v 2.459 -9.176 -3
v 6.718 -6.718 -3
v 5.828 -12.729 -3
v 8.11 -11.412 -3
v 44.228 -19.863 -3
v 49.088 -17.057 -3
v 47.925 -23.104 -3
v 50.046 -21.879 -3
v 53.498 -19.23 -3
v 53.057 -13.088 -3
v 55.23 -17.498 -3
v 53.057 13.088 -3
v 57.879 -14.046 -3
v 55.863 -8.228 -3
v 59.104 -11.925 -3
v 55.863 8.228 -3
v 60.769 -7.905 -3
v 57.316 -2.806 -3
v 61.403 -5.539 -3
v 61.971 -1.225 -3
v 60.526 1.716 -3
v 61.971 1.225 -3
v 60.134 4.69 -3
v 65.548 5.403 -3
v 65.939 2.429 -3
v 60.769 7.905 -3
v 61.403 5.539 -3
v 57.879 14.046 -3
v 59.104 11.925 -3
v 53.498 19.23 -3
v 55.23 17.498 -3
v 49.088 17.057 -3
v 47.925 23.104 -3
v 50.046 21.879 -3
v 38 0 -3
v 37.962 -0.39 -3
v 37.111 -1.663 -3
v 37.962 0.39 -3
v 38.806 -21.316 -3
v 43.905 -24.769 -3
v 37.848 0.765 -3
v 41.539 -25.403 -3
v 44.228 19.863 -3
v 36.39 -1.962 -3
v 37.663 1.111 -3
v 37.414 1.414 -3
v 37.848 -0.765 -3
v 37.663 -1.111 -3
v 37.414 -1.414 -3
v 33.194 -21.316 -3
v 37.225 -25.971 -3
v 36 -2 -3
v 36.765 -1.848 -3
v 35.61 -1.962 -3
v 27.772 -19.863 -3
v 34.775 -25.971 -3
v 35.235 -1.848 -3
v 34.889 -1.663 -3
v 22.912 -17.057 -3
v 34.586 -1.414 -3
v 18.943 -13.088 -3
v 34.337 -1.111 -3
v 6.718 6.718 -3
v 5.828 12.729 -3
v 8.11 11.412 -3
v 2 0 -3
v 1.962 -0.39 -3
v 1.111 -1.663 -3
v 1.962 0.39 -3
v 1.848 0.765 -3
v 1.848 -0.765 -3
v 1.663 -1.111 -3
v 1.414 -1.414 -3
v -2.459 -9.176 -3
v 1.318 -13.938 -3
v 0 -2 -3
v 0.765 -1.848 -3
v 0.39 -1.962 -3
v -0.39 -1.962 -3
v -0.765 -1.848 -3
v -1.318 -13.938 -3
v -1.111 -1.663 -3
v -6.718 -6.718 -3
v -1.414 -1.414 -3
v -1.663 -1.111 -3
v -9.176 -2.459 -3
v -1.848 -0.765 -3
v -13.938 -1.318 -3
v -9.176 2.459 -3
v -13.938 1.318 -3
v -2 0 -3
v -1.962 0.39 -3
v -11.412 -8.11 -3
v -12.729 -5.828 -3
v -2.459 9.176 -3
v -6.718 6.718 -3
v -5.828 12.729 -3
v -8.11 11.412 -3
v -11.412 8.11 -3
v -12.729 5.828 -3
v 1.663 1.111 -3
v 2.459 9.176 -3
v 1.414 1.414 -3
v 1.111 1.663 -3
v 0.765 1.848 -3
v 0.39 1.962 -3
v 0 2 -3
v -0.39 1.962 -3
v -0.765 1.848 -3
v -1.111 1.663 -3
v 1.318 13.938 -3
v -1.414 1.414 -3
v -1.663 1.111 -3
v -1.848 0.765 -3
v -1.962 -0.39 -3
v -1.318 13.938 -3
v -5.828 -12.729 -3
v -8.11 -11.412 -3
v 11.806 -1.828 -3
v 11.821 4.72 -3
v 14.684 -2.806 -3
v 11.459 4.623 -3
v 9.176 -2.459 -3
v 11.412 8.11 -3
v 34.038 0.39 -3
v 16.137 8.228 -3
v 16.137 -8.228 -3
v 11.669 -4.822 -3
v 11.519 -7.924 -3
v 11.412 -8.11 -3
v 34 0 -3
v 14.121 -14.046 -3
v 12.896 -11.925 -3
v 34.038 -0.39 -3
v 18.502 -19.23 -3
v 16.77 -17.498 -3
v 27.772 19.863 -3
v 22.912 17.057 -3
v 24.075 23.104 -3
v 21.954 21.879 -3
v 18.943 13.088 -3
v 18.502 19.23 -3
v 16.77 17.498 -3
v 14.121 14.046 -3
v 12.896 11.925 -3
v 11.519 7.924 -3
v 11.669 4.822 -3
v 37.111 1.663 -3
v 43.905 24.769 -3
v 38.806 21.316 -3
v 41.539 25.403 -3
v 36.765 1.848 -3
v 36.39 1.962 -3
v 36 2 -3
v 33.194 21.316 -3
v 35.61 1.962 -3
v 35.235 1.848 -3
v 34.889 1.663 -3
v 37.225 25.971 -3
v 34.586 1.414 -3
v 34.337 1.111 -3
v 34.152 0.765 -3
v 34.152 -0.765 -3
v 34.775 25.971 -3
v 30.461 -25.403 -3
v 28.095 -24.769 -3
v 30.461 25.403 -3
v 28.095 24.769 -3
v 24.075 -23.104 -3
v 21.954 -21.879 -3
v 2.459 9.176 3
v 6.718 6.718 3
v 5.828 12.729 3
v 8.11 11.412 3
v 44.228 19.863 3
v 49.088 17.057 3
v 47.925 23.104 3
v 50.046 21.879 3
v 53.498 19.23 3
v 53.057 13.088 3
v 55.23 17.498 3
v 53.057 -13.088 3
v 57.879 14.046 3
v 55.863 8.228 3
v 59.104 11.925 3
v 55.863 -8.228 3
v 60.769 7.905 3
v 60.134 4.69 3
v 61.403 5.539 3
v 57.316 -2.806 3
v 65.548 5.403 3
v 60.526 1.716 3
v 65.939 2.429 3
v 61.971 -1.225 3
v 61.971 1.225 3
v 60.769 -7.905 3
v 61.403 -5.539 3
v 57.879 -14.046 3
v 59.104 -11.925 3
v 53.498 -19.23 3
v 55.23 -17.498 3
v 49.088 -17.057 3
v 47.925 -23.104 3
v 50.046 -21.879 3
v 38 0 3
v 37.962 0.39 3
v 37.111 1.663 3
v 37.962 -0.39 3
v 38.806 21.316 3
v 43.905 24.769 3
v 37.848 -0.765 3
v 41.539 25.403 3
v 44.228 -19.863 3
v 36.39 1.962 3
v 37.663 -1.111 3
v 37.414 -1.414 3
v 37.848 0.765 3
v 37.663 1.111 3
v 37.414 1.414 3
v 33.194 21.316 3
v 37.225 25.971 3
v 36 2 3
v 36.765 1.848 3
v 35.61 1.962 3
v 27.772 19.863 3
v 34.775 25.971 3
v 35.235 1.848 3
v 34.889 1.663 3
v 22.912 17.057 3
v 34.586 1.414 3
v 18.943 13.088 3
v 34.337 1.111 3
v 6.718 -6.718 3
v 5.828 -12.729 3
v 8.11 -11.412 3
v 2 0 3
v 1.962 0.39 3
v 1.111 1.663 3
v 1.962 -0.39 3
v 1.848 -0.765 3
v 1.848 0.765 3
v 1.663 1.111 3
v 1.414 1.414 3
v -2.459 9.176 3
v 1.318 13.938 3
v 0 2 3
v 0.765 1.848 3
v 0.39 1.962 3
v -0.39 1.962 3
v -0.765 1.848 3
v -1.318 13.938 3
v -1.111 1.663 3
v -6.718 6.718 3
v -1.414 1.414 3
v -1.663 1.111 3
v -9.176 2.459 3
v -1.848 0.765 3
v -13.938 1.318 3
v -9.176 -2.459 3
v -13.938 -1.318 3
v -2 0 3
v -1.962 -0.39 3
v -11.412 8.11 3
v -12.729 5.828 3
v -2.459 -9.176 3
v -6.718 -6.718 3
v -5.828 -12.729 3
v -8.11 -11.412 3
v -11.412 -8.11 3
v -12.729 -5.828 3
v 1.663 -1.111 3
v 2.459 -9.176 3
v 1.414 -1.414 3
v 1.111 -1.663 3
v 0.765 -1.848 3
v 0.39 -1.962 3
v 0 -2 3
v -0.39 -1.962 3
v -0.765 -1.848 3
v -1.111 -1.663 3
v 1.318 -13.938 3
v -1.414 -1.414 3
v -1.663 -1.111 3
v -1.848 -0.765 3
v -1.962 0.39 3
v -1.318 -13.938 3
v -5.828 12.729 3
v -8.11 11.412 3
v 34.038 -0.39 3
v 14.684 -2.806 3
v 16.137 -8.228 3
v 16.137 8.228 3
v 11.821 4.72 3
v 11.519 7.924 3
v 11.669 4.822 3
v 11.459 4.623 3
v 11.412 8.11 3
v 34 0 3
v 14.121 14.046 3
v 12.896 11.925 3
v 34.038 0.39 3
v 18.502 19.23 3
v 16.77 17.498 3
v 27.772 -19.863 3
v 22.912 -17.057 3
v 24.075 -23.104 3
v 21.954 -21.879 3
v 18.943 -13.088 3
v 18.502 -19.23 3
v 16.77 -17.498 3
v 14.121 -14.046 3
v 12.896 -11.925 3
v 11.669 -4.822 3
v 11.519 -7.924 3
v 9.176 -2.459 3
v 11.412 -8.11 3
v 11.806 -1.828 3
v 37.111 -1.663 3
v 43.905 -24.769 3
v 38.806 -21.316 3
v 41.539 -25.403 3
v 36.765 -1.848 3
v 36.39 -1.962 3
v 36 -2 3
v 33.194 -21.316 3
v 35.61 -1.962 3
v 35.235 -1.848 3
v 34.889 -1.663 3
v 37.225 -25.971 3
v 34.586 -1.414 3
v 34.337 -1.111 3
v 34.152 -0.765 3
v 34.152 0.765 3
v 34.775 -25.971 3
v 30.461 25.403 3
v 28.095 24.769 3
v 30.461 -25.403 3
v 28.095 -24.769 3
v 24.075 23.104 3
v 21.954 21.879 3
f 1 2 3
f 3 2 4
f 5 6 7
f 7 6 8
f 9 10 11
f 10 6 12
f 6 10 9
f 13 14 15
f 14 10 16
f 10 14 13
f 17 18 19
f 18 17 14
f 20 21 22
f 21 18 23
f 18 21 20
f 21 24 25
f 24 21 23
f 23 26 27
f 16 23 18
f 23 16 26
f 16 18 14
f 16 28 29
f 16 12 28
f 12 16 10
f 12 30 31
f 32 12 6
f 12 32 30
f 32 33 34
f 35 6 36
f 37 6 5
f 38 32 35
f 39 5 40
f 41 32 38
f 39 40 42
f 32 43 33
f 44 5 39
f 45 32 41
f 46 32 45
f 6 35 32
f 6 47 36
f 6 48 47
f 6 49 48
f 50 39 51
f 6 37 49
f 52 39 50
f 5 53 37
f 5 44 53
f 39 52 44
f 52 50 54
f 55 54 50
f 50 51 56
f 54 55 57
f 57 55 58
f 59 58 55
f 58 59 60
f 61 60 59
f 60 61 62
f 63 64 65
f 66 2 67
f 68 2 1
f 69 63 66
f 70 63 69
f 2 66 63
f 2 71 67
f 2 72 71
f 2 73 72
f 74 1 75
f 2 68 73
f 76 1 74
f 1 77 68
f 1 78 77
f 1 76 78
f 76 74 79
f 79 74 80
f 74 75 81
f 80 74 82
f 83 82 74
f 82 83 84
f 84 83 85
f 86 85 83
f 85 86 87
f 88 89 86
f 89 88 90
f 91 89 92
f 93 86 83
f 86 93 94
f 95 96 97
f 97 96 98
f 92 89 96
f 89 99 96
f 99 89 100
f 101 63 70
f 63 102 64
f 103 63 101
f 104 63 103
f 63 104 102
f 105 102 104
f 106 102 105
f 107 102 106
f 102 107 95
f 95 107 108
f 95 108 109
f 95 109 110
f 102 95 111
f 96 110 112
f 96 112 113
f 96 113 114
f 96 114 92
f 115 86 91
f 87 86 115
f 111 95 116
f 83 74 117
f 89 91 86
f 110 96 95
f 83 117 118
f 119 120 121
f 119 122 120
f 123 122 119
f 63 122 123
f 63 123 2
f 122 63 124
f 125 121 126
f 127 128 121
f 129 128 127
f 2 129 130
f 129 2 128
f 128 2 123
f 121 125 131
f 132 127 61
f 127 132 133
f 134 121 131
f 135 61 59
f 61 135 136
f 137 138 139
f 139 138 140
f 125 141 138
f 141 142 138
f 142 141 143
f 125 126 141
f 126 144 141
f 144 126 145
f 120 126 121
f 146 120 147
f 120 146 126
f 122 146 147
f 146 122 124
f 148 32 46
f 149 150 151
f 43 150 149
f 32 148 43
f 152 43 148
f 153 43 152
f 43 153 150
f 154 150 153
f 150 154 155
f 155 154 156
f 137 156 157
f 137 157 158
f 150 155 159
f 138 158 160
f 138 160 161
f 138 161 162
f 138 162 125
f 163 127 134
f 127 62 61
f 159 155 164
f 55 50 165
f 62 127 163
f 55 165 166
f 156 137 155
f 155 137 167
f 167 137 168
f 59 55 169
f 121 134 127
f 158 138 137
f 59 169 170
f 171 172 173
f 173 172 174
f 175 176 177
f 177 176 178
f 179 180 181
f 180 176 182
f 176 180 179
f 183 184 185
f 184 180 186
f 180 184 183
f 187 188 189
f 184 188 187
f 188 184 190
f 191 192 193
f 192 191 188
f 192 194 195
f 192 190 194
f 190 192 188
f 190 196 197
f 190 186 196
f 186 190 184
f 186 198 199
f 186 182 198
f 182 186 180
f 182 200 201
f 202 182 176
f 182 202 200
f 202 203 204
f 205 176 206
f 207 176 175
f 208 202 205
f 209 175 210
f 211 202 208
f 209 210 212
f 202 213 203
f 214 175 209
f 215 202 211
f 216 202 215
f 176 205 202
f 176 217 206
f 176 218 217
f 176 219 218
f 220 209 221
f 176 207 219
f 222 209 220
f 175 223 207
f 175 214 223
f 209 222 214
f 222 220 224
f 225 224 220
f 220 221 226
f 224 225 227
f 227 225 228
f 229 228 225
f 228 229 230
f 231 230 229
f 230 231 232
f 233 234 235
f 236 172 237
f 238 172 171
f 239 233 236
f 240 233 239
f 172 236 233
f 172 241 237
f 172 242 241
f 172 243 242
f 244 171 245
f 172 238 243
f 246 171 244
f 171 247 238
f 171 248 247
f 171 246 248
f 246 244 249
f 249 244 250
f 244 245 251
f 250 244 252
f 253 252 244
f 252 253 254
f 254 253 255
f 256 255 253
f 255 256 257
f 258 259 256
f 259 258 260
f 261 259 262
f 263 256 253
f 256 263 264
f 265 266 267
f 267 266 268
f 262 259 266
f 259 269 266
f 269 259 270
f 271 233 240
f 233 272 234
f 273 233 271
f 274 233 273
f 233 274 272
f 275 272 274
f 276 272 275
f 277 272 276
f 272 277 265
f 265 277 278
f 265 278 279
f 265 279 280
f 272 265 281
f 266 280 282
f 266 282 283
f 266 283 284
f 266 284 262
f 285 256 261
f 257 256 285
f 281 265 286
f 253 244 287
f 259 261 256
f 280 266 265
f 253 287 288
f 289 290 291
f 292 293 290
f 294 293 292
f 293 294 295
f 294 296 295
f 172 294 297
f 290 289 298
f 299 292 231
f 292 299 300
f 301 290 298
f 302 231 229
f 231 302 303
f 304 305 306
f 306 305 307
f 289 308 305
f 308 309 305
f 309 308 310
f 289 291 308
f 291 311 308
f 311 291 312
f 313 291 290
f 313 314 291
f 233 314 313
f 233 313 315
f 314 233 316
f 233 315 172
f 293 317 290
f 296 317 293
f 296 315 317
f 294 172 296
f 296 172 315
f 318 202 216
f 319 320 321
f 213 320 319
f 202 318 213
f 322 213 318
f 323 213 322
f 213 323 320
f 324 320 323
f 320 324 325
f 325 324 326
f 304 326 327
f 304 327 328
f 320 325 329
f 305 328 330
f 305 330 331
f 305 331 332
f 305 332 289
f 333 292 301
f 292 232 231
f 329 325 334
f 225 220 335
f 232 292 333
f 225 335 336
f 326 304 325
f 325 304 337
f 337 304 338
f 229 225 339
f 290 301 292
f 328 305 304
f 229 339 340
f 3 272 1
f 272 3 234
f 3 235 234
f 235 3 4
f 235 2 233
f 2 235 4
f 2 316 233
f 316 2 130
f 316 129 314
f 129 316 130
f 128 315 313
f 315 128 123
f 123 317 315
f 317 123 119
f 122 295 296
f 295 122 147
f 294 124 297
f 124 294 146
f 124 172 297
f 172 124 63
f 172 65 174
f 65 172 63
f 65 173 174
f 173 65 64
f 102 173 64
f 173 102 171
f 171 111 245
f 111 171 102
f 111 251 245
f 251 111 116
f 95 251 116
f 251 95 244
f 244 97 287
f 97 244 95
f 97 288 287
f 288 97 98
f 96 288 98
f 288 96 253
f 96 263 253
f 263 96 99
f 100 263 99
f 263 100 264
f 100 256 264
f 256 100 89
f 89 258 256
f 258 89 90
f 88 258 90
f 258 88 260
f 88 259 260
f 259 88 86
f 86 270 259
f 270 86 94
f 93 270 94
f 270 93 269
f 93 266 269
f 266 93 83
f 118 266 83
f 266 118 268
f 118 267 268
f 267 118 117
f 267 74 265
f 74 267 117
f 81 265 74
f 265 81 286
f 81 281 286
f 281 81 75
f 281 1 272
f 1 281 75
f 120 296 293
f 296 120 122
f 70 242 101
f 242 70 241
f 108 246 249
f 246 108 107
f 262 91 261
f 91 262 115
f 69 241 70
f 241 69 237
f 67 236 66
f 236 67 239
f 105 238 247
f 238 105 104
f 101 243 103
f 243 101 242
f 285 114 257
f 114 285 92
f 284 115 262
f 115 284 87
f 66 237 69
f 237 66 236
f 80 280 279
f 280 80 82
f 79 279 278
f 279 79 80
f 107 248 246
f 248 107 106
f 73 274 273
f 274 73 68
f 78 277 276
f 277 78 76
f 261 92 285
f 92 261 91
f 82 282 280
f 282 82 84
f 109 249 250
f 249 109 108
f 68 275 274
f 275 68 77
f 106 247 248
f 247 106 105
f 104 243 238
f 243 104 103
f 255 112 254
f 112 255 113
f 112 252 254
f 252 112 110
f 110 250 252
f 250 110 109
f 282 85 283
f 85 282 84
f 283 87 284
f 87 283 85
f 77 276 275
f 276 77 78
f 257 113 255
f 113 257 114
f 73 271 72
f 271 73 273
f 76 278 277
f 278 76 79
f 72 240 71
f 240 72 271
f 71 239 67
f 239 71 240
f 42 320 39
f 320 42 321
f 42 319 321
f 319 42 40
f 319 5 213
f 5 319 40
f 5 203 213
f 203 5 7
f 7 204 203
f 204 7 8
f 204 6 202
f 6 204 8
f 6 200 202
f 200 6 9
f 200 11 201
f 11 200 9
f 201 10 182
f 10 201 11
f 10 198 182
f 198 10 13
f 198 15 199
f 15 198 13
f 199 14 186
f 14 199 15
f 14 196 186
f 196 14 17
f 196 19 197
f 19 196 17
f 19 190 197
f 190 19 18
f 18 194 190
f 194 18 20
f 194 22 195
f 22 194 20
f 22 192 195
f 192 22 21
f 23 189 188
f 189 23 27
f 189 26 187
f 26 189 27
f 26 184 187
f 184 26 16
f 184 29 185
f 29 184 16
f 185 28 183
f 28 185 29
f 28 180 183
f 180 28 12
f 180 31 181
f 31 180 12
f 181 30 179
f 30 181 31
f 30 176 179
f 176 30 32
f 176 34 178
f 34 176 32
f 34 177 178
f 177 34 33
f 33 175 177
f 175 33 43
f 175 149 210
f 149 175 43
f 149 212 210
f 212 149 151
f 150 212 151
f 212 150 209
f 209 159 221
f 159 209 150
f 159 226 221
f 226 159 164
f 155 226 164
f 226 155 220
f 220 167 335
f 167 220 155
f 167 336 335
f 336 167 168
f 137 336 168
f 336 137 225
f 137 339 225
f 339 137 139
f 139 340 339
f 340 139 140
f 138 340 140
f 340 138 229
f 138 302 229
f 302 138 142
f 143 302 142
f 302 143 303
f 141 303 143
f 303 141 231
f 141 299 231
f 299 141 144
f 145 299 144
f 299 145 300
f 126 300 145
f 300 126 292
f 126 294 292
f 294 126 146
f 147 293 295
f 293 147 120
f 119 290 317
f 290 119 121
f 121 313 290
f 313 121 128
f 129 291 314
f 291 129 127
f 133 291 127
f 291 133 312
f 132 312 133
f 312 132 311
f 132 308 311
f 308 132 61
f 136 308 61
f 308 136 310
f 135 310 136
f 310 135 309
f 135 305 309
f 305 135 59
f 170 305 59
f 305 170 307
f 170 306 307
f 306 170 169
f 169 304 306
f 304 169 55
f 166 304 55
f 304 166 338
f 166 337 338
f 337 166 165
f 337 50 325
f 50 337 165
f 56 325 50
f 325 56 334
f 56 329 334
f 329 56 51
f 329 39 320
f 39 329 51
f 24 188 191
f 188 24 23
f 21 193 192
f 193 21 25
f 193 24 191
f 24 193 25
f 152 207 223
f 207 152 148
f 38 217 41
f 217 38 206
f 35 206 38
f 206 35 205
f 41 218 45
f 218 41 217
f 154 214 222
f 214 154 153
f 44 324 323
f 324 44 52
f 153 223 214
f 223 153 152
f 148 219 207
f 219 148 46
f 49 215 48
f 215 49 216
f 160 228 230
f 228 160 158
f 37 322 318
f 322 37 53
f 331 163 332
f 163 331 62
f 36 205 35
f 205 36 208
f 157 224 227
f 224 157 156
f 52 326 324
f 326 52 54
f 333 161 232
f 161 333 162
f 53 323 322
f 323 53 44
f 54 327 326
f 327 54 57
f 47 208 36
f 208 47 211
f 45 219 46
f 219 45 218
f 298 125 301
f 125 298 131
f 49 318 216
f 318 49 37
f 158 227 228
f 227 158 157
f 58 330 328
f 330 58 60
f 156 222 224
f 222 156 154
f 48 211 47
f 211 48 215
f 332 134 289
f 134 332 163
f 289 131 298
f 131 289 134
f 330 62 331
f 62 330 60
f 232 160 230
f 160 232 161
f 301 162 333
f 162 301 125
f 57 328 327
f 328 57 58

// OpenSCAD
// Original external spur-gear pair fixture, millimetres.
// Two gears with a radial index tab; the tab is a measurement feature, not a
// claim about tooth contact, backlash, strength or manufacturing tolerance.
agentscad_part = "all";
agentscad_pose = false;
input_deg = 0;
ratio_sign = -1;

module_mm = 2;
pinion_teeth = 12;
wheel_teeth = 24;
thickness = 6;
center_distance = module_mm * (pinion_teeth + wheel_teeth) / 2;
pinion_pitch = module_mm * pinion_teeth / 2;
wheel_pitch = module_mm * wheel_teeth / 2;
addendum = module_mm;
dedendum = 1.25 * module_mm;
marker_min_r_mm = 0;
marker_max_r_mm = 0;

wheel_angle_deg = ratio_sign * input_deg * 0.4;

module gear_outline(teeth, pitch_radius) {
  tip_radius = pitch_radius + addendum;
  root_radius = pitch_radius - dedendum;
  half_pitch_deg = 180 / teeth;
  tip_half_deg = 0.18 * 360 / teeth;
  points = [
    for (i = [0 : teeth - 1], k = [0 : 2])
      let (a = i * 360 / teeth + (k == 0 ? -half_pitch_deg : (k == 1 ? -tip_half_deg : tip_half_deg)),
           r = k == 0 ? root_radius : tip_radius)
      [r * cos(a), r * sin(a)]
  ];
  linear_extrude(height = thickness, center = true, convexity = 10)
    polygon(points = points);
}

module gear_body(teeth, pitch_radius) {
  root_r = pitch_radius - dedendum;
  tip_r = pitch_radius + addendum;
  // Radial index tab in a root gap (half a tooth pitch from the first tooth).
  // Its outer vertices are the only measurement feature outside the addendum.
  marker_angle = 180 / teeth;
  marker_outer_r = tip_r + 4;
  marker_inner_r = root_r - 0.5;
  difference() {
    union() {
      gear_outline(teeth, pitch_radius);
      rotate([0, 0, marker_angle])
        translate([(marker_inner_r + marker_outer_r) / 2, 0, 0])
          cube([marker_outer_r - marker_inner_r, 3, thickness], center = true);
    }
    cylinder(h = thickness + 2, r = 2, center = true, $fn = 32);
  }
}

module pinion_local() { gear_body(pinion_teeth, pinion_pitch); }
module wheel_local() { gear_body(wheel_teeth, wheel_pitch); }

module generated_part() {
  if (agentscad_part == "pinion") {
    pinion_local();
  } else if (agentscad_part == "wheel") {
    wheel_local();
  } else if (agentscad_part == "pinion_pose") {
    rotate([0, 0, input_deg]) pinion_local();
  } else if (agentscad_part == "wheel_pose") {
    translate([center_distance, 0, 0])
      rotate([0, 0, wheel_angle_deg]) wheel_local();
  } else {
    rotate([0, 0, input_deg]) pinion_local();
    translate([center_distance, 0, 0])
      rotate([0, 0, wheel_angle_deg]) wheel_local();
  }
}

generated_part();
